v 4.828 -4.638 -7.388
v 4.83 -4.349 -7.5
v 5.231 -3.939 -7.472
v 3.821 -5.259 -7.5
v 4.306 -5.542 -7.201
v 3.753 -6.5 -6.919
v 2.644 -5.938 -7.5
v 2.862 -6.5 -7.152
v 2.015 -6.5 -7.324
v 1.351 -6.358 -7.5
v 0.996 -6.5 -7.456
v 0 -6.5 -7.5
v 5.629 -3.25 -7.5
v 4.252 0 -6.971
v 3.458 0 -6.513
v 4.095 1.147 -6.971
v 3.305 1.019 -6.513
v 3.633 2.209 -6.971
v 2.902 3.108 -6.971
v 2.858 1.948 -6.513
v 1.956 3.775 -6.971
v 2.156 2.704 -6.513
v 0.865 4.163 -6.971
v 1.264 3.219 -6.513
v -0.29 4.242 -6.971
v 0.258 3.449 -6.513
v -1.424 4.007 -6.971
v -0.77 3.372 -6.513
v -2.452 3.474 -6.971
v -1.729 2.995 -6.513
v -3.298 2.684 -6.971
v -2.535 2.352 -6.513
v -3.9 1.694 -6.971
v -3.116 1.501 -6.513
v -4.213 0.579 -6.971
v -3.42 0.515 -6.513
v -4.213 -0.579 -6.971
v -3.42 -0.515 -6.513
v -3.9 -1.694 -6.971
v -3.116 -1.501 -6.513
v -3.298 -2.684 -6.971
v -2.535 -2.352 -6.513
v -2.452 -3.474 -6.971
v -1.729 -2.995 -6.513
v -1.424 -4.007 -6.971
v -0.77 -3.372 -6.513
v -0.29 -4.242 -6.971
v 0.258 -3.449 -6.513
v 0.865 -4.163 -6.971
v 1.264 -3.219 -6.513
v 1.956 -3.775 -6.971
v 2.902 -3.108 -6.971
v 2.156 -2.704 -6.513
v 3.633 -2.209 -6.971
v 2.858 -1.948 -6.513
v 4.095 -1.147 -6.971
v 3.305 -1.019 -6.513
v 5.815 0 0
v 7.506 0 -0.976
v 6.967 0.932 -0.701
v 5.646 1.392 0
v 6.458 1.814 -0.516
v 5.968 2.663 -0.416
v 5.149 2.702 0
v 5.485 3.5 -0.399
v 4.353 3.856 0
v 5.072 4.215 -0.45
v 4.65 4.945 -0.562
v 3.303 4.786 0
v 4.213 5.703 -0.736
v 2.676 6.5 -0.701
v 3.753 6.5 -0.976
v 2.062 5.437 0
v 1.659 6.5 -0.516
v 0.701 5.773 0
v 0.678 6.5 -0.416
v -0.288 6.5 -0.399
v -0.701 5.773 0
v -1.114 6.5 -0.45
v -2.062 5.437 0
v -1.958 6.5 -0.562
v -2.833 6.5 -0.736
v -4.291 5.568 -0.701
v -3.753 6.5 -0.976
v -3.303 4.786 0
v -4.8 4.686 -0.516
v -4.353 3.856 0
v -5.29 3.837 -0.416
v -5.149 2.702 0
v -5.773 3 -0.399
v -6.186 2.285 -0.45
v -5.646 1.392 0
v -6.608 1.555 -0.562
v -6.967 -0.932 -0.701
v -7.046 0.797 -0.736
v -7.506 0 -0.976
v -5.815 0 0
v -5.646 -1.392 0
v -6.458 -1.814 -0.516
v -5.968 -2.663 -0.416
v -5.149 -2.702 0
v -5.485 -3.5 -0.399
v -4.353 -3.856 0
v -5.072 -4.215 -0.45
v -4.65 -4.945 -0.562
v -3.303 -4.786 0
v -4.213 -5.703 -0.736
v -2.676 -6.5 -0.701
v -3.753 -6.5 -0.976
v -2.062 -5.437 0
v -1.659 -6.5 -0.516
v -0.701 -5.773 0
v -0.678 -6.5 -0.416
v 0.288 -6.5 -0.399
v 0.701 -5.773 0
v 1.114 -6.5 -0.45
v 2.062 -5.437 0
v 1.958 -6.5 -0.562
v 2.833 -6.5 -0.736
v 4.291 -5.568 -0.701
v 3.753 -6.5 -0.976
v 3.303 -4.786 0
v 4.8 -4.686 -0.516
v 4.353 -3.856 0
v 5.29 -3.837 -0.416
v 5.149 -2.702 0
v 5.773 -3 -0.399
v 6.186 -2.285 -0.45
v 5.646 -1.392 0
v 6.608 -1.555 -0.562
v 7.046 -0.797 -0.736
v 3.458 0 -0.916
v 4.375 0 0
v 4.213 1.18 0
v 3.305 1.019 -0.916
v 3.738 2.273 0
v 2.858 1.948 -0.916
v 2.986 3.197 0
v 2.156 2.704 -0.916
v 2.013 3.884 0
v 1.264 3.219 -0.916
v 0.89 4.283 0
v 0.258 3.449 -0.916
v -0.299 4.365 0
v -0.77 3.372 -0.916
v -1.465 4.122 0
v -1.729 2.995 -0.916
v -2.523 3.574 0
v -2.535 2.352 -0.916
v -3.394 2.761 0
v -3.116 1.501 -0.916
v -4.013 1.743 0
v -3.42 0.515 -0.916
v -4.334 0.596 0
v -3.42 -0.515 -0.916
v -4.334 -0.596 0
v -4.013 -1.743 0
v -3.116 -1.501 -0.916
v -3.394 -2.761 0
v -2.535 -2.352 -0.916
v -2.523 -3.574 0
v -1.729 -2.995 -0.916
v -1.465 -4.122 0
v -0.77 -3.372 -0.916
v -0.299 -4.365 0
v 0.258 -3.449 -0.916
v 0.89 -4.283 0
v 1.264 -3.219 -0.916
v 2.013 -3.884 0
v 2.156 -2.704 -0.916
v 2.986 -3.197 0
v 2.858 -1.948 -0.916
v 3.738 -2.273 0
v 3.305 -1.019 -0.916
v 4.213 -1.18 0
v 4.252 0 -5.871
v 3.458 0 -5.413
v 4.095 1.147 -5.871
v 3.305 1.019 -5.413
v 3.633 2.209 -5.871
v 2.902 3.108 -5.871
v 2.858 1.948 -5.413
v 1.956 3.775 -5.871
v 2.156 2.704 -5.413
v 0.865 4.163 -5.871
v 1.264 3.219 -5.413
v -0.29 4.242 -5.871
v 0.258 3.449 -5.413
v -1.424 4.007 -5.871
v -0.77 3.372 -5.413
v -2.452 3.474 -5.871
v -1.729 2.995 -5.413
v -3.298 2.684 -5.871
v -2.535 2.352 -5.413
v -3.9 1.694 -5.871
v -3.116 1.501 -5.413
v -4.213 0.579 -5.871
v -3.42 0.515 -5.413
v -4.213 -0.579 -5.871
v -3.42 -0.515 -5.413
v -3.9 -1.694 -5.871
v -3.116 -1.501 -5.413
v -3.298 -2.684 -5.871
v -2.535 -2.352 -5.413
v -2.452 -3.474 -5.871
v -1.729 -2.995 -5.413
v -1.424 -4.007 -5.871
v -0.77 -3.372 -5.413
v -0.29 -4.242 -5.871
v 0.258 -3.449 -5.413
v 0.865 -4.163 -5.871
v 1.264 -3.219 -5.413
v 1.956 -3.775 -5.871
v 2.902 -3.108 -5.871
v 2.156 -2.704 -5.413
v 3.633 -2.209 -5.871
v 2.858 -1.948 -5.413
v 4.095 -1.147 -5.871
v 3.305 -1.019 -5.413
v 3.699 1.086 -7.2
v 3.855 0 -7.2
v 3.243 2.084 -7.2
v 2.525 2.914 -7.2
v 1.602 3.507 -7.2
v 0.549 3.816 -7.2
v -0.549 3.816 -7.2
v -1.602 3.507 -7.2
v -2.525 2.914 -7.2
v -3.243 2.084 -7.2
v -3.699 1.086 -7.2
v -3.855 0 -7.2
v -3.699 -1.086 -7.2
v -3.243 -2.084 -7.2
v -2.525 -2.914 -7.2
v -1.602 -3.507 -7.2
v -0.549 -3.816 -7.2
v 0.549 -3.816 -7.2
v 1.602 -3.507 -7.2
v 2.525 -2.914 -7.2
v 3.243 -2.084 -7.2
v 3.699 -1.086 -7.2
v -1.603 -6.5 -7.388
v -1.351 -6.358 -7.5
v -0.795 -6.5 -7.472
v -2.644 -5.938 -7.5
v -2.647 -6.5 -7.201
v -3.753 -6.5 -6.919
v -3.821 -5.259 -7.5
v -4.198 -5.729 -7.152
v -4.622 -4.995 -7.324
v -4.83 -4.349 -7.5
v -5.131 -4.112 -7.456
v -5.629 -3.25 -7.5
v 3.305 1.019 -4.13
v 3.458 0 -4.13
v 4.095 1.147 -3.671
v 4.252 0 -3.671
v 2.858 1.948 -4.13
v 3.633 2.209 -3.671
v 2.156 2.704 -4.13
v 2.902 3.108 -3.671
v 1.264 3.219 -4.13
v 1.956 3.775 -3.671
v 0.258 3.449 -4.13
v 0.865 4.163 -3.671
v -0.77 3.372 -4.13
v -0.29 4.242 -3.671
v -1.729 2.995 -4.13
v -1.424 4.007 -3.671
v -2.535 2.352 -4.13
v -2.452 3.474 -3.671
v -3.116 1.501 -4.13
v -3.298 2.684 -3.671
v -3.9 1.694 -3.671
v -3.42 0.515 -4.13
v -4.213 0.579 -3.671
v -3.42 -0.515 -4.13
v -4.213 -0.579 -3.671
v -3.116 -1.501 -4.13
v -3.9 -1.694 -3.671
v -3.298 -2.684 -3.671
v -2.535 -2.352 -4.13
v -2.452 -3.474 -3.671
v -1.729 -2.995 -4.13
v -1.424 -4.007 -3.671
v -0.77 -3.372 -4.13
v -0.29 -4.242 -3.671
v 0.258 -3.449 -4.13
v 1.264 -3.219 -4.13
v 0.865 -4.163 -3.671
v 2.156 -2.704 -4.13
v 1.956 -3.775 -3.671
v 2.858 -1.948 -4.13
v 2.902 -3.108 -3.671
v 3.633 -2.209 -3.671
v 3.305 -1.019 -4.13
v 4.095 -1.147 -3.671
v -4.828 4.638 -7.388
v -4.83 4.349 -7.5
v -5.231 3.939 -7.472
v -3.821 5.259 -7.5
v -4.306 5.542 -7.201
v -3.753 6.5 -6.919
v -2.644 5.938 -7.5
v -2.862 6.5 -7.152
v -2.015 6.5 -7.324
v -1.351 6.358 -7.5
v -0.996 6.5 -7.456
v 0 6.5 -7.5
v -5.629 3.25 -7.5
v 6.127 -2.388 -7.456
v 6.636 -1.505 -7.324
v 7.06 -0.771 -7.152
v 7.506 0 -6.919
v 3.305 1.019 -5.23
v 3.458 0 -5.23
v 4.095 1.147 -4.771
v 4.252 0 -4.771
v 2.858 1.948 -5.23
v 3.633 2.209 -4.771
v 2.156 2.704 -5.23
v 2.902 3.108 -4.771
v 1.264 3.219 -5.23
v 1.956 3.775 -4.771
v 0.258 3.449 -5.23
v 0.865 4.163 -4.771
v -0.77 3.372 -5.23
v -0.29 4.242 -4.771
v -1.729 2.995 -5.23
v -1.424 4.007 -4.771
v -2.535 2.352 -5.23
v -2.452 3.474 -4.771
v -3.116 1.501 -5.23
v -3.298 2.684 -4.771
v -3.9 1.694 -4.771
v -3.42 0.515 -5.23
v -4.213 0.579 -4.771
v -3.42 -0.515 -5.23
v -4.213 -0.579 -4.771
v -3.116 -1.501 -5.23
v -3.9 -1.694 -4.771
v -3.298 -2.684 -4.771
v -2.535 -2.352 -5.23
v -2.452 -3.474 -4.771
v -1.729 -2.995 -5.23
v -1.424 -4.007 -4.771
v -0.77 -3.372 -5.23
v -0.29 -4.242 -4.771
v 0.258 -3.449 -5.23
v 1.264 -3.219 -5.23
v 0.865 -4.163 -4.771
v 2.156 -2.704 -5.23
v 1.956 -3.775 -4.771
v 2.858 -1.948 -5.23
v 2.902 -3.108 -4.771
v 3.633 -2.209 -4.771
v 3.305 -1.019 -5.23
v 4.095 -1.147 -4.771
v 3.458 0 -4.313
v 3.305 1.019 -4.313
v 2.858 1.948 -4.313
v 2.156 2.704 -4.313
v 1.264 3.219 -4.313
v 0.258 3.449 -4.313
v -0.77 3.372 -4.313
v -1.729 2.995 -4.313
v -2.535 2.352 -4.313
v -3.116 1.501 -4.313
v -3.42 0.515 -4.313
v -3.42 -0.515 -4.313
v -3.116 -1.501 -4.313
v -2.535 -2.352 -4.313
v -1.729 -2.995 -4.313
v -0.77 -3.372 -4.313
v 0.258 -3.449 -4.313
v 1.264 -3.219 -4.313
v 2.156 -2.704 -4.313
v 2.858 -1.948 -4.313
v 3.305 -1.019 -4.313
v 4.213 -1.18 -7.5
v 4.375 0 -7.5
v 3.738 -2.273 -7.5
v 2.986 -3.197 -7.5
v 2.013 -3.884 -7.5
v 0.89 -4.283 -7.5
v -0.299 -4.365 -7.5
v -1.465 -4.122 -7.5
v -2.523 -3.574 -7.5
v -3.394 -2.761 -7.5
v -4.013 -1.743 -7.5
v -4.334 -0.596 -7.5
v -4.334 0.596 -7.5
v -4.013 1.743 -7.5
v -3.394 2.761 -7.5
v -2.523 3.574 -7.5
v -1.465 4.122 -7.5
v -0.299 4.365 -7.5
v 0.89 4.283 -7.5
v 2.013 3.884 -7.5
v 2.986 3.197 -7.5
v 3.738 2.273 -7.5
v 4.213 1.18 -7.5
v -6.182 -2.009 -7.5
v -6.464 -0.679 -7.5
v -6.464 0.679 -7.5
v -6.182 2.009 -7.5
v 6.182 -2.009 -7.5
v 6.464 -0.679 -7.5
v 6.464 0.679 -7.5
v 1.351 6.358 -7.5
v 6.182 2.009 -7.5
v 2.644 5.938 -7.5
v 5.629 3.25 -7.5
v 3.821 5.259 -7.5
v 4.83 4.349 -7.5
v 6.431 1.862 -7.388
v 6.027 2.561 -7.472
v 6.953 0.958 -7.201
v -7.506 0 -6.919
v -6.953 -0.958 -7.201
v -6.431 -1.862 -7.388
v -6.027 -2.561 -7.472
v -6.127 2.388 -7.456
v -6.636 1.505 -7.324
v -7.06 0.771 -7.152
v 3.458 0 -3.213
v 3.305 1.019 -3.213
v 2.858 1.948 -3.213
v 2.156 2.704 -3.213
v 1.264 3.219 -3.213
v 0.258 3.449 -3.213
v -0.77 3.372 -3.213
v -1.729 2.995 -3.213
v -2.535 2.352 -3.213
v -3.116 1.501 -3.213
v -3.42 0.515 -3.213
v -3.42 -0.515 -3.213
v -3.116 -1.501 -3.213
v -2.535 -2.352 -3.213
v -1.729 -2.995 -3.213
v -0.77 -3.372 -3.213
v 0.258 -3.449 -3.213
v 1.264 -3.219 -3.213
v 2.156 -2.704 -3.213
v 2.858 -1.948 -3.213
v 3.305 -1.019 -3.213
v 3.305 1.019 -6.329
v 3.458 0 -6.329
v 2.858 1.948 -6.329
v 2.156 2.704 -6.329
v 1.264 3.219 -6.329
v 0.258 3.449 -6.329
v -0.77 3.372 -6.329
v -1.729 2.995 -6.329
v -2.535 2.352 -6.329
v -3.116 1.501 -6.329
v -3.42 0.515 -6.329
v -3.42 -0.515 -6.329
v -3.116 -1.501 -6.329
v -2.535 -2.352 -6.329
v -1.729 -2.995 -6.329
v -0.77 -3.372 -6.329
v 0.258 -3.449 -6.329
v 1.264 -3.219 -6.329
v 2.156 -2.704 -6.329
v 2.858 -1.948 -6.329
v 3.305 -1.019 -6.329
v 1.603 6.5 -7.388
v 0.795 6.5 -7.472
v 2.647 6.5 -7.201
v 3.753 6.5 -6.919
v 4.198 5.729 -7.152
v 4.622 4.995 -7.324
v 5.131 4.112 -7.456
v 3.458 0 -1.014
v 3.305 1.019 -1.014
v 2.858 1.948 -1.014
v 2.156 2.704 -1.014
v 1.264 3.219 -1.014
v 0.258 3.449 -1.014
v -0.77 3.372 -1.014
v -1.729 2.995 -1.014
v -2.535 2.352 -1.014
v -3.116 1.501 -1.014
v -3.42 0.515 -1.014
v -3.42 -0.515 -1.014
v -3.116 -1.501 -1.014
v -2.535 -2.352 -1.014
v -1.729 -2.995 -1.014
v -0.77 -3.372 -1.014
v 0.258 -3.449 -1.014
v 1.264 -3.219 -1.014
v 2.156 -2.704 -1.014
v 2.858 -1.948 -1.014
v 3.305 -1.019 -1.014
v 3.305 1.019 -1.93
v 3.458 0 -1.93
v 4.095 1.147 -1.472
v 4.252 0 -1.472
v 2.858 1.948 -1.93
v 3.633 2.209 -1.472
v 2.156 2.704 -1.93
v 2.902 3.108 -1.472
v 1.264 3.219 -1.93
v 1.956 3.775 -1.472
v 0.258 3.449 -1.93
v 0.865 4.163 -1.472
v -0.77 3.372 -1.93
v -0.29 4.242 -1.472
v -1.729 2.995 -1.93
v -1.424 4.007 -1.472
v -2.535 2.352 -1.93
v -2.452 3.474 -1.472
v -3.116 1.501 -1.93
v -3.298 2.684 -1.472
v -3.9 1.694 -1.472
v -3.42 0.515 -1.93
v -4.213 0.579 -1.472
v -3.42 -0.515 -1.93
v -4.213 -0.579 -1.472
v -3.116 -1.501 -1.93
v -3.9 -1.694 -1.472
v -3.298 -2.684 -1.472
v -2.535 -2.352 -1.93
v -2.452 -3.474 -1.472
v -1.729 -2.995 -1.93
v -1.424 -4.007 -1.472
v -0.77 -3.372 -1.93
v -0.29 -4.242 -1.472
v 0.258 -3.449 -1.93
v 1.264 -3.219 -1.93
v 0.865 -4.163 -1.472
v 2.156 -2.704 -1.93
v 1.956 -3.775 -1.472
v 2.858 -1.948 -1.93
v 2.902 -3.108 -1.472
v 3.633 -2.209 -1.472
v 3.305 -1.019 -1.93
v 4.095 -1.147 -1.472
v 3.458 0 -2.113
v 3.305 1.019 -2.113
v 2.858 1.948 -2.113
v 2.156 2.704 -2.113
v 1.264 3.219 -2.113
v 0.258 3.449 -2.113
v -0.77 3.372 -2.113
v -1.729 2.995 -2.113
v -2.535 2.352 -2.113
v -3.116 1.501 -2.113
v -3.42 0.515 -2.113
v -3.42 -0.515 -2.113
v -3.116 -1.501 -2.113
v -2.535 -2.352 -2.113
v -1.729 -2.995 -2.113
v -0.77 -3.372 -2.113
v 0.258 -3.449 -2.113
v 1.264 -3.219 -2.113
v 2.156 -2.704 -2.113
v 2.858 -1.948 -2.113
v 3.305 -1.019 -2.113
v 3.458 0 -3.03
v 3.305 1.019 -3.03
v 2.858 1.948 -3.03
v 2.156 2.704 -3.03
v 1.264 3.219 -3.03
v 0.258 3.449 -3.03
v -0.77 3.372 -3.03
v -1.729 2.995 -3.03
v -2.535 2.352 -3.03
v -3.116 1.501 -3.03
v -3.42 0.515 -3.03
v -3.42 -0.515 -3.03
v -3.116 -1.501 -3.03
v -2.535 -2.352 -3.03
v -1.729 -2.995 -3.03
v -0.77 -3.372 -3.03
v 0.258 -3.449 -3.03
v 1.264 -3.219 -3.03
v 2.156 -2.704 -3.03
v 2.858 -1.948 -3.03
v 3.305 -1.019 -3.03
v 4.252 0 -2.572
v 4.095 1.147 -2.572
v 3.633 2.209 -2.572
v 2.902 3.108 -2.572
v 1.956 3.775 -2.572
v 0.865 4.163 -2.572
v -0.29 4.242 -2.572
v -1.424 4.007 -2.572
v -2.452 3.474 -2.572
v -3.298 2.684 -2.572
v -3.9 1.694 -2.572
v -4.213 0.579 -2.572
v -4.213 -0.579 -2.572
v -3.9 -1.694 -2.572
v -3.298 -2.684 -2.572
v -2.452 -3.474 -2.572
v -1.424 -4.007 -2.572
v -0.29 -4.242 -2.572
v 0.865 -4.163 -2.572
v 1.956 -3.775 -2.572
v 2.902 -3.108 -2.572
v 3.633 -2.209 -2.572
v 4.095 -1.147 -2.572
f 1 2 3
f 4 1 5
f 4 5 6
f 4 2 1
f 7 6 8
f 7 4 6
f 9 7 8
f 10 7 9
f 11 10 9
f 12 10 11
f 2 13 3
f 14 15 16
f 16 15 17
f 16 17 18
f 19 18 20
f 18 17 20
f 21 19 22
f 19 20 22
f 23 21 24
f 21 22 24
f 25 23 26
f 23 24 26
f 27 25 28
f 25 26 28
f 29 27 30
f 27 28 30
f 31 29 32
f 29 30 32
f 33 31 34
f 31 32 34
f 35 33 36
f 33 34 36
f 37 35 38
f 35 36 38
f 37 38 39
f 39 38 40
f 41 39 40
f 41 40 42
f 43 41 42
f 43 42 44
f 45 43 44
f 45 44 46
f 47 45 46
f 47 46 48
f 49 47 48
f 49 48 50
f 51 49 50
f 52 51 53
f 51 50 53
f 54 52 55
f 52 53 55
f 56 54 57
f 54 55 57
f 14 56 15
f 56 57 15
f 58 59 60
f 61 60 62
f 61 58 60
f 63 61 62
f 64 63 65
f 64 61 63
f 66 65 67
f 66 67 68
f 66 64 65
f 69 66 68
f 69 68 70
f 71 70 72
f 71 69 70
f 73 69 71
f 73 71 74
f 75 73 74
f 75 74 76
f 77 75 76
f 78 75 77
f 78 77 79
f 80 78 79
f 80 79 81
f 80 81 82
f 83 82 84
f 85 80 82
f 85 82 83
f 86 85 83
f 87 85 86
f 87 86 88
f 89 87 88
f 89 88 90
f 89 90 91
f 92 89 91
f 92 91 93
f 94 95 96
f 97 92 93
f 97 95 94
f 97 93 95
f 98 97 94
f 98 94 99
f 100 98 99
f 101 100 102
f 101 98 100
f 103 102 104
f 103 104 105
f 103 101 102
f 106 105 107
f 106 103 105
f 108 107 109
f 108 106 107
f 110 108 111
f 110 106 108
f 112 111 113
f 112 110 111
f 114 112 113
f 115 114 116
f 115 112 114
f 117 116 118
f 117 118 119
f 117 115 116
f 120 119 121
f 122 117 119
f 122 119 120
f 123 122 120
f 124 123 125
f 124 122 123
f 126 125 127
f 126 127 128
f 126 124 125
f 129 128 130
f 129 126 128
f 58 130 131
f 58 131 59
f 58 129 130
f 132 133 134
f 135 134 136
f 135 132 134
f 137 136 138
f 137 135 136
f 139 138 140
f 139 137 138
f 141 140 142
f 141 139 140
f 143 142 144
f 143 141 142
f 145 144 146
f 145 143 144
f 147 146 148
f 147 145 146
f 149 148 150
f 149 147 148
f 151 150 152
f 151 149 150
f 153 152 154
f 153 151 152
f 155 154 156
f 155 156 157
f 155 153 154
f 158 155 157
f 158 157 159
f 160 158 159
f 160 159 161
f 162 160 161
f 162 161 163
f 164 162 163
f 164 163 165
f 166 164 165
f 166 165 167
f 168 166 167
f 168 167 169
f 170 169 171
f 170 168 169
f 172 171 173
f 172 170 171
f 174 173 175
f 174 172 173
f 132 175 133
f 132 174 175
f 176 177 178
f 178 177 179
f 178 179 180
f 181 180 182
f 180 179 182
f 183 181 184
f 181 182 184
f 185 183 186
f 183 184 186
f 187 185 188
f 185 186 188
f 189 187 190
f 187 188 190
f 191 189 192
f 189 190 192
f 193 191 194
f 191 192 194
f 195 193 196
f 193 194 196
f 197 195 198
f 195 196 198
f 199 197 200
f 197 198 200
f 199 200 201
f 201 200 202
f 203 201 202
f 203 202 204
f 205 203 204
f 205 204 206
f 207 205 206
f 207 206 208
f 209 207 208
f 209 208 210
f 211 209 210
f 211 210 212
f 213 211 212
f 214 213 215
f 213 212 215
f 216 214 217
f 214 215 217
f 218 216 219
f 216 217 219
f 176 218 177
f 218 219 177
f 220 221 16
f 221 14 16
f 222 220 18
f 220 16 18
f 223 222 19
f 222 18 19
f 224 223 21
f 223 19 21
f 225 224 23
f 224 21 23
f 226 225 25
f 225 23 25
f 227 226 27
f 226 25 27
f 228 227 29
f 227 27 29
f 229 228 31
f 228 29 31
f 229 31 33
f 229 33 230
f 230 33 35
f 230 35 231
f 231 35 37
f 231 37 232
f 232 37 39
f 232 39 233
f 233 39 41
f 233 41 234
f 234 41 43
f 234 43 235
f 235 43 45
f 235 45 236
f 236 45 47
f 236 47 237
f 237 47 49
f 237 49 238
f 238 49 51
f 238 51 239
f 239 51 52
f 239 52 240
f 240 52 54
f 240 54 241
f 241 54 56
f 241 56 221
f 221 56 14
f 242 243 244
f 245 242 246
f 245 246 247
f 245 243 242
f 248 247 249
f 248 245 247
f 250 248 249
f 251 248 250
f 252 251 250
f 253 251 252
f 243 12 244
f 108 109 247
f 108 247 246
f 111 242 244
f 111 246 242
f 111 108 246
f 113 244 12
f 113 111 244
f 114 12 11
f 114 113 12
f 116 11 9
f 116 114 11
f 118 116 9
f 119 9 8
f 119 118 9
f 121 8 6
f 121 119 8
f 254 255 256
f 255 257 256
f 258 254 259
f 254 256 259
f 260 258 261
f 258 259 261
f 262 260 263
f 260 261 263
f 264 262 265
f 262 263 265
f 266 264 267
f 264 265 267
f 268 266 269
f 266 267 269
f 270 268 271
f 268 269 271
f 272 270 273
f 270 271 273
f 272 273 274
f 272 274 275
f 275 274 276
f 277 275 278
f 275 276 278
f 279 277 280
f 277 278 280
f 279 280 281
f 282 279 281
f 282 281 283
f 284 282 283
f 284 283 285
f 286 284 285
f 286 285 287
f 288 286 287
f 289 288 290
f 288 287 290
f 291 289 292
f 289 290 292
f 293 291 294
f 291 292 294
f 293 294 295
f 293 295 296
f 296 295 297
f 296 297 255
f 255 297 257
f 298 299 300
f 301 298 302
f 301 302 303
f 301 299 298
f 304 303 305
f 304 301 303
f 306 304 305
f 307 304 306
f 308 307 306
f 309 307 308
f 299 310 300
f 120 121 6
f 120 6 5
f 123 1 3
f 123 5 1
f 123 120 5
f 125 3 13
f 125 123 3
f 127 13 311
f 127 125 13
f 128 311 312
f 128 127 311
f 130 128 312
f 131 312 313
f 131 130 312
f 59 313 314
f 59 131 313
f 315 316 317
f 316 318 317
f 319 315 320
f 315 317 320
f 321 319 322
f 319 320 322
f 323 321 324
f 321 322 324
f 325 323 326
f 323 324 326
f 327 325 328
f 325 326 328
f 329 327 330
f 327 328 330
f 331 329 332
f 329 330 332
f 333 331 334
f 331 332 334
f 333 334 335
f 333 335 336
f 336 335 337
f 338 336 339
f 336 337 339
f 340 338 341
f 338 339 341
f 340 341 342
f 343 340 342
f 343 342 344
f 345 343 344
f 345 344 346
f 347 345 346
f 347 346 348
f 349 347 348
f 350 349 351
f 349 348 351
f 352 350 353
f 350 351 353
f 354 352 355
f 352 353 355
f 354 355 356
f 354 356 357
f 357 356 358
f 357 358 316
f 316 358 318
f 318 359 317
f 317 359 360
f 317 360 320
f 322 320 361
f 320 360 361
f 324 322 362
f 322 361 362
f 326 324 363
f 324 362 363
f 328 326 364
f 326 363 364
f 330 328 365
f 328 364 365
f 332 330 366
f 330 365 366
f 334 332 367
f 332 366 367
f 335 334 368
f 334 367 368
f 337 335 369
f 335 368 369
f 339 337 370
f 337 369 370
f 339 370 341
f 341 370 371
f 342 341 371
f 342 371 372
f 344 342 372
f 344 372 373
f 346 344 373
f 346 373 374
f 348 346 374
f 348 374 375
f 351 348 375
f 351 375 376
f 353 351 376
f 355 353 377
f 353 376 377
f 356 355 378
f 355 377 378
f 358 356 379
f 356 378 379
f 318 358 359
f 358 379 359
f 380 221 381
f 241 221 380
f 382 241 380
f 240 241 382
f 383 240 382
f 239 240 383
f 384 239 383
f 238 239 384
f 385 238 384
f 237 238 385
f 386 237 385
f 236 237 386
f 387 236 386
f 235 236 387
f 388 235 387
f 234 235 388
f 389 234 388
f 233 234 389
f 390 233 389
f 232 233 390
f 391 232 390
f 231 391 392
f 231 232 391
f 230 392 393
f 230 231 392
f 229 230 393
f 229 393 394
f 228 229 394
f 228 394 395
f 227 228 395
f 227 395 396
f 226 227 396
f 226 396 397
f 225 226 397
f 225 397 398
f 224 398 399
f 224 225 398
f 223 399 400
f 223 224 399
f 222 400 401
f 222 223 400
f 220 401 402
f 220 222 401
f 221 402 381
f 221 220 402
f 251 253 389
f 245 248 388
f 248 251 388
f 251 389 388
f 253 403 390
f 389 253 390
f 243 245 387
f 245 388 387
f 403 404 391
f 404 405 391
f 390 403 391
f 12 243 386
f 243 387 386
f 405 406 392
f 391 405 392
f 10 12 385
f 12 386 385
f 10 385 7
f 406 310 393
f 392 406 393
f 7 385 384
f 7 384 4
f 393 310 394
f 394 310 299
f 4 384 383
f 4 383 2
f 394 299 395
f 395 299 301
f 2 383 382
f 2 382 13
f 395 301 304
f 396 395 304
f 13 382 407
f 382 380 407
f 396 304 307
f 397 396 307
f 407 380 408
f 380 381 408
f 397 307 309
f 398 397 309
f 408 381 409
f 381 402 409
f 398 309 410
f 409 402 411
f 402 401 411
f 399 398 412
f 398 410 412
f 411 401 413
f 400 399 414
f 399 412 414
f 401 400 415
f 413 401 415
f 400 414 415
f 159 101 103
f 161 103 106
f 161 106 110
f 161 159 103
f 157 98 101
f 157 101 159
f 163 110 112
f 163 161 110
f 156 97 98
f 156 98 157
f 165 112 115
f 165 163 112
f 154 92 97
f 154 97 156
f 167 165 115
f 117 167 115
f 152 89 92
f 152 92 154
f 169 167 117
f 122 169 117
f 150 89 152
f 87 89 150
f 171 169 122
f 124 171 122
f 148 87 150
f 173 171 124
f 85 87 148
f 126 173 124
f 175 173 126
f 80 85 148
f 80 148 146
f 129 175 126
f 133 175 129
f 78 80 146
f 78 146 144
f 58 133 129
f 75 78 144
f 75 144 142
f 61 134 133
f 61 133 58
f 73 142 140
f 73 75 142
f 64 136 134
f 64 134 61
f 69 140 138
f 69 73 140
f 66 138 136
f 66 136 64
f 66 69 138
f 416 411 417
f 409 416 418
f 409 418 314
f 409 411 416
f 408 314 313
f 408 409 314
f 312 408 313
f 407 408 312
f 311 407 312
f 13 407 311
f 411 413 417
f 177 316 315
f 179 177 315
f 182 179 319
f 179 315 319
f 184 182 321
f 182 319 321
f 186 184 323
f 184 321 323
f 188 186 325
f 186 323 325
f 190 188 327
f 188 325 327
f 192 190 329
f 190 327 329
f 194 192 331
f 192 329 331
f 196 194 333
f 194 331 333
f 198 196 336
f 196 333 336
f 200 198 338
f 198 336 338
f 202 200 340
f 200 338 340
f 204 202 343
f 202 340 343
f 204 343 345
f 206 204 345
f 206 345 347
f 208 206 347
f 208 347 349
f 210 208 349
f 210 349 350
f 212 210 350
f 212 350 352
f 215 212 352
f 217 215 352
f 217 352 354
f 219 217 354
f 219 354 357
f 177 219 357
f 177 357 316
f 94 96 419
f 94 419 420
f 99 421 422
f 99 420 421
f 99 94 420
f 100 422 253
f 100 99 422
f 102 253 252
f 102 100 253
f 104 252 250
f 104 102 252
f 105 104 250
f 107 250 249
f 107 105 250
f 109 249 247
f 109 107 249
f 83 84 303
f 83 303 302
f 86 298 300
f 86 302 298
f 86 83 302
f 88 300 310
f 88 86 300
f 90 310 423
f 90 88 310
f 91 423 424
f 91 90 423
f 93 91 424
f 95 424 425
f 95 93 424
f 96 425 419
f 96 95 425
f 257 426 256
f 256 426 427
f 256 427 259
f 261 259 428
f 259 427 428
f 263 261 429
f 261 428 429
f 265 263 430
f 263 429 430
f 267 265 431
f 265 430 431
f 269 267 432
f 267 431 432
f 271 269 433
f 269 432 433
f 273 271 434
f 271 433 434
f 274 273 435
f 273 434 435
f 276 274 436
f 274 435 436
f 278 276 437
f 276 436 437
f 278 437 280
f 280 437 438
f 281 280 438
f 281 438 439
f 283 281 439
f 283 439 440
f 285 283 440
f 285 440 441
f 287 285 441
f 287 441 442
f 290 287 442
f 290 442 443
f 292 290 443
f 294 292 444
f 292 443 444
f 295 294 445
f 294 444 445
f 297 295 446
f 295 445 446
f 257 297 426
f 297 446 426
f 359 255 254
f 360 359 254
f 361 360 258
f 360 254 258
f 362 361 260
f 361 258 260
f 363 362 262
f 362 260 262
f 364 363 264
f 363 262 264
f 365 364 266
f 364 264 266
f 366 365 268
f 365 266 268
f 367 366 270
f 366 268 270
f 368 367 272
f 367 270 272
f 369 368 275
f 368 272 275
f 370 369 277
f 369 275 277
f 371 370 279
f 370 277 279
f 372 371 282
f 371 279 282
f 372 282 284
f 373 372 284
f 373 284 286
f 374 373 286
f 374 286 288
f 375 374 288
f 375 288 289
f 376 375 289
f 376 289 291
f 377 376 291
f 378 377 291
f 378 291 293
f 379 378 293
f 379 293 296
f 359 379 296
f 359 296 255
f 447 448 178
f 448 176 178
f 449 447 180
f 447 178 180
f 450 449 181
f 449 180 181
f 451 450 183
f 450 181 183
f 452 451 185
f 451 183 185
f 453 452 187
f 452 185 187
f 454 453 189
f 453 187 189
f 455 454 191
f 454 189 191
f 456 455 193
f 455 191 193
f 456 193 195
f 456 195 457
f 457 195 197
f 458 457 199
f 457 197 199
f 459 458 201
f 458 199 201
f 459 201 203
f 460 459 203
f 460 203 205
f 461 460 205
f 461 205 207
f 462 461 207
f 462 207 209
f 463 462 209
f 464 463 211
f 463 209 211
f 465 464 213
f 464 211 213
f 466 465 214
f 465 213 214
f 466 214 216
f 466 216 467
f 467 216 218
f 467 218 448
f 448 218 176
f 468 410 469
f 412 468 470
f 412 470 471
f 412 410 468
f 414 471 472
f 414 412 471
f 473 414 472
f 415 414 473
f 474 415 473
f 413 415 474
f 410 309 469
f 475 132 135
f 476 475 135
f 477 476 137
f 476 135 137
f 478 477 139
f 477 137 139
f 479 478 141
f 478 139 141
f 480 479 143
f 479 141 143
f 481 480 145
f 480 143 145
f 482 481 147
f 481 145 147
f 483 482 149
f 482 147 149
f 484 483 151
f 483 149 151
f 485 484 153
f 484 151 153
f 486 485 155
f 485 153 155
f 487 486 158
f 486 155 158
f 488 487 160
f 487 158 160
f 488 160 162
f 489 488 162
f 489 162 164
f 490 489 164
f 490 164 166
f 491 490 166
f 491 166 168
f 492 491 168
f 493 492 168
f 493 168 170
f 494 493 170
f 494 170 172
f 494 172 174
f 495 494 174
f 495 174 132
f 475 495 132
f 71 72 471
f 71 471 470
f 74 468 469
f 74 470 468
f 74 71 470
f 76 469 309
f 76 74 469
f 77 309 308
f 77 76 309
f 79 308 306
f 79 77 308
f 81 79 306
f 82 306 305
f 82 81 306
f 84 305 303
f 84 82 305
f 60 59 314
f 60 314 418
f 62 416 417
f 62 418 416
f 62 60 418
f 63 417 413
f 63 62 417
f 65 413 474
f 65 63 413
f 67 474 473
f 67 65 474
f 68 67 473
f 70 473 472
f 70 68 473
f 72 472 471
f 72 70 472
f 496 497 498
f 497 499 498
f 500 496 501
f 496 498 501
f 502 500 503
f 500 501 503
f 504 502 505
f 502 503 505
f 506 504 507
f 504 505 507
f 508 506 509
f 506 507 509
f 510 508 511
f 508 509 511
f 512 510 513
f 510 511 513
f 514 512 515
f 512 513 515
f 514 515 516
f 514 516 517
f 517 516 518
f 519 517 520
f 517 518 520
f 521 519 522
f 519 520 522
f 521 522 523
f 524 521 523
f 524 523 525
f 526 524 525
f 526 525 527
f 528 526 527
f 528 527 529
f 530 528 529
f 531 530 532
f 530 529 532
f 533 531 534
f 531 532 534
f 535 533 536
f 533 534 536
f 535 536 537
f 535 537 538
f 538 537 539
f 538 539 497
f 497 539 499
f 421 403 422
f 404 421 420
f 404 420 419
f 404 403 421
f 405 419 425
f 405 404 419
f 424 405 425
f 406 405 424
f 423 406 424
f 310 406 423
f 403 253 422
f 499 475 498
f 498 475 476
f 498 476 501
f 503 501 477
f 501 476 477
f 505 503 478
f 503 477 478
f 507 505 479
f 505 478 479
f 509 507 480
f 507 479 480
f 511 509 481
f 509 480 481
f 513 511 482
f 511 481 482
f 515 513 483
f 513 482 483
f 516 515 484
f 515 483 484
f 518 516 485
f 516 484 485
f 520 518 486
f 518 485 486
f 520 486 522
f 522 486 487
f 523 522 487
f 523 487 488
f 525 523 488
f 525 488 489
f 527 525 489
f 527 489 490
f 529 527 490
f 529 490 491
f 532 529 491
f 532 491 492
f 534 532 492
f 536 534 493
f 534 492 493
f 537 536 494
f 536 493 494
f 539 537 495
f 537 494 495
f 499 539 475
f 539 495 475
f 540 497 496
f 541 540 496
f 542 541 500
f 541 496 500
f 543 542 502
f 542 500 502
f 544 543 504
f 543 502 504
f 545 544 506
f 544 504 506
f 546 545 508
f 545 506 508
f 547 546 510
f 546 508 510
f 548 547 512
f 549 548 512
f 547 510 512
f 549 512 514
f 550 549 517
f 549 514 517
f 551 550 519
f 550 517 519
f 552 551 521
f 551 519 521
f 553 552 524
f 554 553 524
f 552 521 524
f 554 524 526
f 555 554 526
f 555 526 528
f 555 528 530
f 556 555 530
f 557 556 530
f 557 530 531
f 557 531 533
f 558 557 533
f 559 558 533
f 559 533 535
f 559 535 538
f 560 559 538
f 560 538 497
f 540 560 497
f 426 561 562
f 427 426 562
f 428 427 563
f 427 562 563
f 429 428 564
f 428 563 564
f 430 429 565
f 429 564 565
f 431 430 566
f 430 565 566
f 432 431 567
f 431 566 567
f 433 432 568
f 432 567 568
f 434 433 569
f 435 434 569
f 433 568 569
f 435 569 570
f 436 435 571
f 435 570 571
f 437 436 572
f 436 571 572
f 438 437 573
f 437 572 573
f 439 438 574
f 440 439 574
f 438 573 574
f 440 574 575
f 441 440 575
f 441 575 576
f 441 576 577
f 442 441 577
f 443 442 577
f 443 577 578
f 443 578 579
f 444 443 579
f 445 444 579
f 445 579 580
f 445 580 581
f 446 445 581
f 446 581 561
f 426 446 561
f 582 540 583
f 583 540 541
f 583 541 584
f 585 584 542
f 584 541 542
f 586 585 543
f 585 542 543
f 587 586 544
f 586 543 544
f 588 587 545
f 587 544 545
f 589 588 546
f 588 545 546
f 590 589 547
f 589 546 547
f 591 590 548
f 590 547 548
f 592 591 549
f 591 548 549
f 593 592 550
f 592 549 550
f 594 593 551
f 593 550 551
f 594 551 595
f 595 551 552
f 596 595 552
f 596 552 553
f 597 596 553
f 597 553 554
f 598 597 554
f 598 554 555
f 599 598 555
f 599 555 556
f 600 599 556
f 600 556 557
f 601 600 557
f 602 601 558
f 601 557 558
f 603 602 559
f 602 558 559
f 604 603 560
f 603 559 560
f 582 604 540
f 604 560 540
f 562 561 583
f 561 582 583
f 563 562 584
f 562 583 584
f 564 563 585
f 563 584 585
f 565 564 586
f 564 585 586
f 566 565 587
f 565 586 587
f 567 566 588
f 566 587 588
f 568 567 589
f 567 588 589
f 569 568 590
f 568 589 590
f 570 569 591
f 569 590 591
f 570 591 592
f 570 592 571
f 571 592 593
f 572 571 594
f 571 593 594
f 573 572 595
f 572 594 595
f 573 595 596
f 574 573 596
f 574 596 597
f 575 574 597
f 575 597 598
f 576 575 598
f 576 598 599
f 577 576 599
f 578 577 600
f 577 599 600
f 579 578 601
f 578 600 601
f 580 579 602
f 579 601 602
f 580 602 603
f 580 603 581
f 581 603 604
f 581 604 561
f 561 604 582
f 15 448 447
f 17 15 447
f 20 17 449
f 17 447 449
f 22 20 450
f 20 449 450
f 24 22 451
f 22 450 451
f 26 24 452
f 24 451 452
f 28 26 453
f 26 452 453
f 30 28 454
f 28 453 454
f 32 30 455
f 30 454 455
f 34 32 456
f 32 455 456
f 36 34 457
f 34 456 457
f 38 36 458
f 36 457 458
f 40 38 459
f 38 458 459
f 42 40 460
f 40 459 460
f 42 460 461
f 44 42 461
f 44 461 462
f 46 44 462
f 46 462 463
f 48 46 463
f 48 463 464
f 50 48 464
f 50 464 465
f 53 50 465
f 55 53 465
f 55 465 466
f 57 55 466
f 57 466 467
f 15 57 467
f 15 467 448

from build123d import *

# Parameters (mm, degrees)
SKETCH1_R        = 3.4585
BASENUT_DEPTH    = 7.5
ENDCHAMFER2_SIZE = 0.9165
LPATTERN10_COUNT = 6
LPATTERN10_PITCH = 1.0998


with BuildPart() as part:
    # Sketch1 → BaseNut (new body)
    with BuildSketch(Plane.XY):
        Polygon((3.75277675, -6.5), (7.505553499, 0), (3.75277675, 6.5), (-3.75277675, 6.5), (-7.505553499, 0), (-3.75277675, -6.5), align=None)
        Circle(SKETCH1_R, mode=Mode.SUBTRACT)
    extrude(amount=-BASENUT_DEPTH)

    # Sketch2 → Chamfer1 (revolve, cut)
    with BuildSketch(Plane(origin=(15.04811501, 0, -16.706149795), x_dir=(0, 0, -1), z_dir=(0, 1, 0))):
        Polygon((-9.786706379, 22.553668509), (-9.206149795, 21.54811501), (-9.206149795, 22.553668509), align=None)
    revolve(axis=Axis((0, 0, 7.016501752), (0, 0, -1)), mode=Mode.SUBTRACT)

    # Sketch6 → EndChamfer1 (revolve, cut)
    with BuildSketch(Plane(origin=(-9.197458863, 0, -10.252541137), x_dir=(0, 0, 1), z_dir=(0, 1, 0))):
        Polygon((2.752541137, 12.655958863), (2.752541137, 13.572458863), (3.281682659, 12.655958863), align=None)
    revolve(axis=Axis((0, 0, 13.104863586), (0, 0, -1)), mode=Mode.SUBTRACT)

    # Sketch5 → Chamfer2 (revolve, cut)
    with BuildSketch(Plane(origin=(-14.793032735, 0, -16.96123207), x_dir=(0, 0, 1), z_dir=(0, 1, 0))):
        Polygon((16.96123207, 20.608032735), (16.96123207, 22.298586235), (15.985190552, 22.298586235), align=None)
    revolve(axis=Axis((0, 0, -39.536013381), (0, 0, 1)), mode=Mode.SUBTRACT)

    # EndChamfer2
    endchamfer2_edges = [part.edges().sort_by_distance(p)[0] for p in [
        (-3.4585, 0, 0),
    ]]
    chamfer(endchamfer2_edges, length=ENDCHAMFER2_SIZE)

    # Sketch7 → Cut-Revolve10 (revolve, cut)
    with BuildSketch(Plane(origin=(0, 0, 0), x_dir=(1, 0, 0), z_dir=(0, 1, 0))):
        Polygon((2.542, 7.429108478), (3.4585, 7.429108478), (4.252212283, 6.970858478), (3.4585, 6.512608478), (2.542, 6.512608478), align=None)
    cut_revolve10 = revolve(axis=Axis((0, 0, -48.618332322), (0, 0, 1)), mode=Mode.SUBTRACT)

    # LPattern10: Cut-Revolve10 ×6
    with Locations(*[(0, 0, i * LPATTERN10_PITCH) for i in range(1, LPATTERN10_COUNT)]):
        add(cut_revolve10, mode=Mode.SUBTRACT)


solid = part.part
